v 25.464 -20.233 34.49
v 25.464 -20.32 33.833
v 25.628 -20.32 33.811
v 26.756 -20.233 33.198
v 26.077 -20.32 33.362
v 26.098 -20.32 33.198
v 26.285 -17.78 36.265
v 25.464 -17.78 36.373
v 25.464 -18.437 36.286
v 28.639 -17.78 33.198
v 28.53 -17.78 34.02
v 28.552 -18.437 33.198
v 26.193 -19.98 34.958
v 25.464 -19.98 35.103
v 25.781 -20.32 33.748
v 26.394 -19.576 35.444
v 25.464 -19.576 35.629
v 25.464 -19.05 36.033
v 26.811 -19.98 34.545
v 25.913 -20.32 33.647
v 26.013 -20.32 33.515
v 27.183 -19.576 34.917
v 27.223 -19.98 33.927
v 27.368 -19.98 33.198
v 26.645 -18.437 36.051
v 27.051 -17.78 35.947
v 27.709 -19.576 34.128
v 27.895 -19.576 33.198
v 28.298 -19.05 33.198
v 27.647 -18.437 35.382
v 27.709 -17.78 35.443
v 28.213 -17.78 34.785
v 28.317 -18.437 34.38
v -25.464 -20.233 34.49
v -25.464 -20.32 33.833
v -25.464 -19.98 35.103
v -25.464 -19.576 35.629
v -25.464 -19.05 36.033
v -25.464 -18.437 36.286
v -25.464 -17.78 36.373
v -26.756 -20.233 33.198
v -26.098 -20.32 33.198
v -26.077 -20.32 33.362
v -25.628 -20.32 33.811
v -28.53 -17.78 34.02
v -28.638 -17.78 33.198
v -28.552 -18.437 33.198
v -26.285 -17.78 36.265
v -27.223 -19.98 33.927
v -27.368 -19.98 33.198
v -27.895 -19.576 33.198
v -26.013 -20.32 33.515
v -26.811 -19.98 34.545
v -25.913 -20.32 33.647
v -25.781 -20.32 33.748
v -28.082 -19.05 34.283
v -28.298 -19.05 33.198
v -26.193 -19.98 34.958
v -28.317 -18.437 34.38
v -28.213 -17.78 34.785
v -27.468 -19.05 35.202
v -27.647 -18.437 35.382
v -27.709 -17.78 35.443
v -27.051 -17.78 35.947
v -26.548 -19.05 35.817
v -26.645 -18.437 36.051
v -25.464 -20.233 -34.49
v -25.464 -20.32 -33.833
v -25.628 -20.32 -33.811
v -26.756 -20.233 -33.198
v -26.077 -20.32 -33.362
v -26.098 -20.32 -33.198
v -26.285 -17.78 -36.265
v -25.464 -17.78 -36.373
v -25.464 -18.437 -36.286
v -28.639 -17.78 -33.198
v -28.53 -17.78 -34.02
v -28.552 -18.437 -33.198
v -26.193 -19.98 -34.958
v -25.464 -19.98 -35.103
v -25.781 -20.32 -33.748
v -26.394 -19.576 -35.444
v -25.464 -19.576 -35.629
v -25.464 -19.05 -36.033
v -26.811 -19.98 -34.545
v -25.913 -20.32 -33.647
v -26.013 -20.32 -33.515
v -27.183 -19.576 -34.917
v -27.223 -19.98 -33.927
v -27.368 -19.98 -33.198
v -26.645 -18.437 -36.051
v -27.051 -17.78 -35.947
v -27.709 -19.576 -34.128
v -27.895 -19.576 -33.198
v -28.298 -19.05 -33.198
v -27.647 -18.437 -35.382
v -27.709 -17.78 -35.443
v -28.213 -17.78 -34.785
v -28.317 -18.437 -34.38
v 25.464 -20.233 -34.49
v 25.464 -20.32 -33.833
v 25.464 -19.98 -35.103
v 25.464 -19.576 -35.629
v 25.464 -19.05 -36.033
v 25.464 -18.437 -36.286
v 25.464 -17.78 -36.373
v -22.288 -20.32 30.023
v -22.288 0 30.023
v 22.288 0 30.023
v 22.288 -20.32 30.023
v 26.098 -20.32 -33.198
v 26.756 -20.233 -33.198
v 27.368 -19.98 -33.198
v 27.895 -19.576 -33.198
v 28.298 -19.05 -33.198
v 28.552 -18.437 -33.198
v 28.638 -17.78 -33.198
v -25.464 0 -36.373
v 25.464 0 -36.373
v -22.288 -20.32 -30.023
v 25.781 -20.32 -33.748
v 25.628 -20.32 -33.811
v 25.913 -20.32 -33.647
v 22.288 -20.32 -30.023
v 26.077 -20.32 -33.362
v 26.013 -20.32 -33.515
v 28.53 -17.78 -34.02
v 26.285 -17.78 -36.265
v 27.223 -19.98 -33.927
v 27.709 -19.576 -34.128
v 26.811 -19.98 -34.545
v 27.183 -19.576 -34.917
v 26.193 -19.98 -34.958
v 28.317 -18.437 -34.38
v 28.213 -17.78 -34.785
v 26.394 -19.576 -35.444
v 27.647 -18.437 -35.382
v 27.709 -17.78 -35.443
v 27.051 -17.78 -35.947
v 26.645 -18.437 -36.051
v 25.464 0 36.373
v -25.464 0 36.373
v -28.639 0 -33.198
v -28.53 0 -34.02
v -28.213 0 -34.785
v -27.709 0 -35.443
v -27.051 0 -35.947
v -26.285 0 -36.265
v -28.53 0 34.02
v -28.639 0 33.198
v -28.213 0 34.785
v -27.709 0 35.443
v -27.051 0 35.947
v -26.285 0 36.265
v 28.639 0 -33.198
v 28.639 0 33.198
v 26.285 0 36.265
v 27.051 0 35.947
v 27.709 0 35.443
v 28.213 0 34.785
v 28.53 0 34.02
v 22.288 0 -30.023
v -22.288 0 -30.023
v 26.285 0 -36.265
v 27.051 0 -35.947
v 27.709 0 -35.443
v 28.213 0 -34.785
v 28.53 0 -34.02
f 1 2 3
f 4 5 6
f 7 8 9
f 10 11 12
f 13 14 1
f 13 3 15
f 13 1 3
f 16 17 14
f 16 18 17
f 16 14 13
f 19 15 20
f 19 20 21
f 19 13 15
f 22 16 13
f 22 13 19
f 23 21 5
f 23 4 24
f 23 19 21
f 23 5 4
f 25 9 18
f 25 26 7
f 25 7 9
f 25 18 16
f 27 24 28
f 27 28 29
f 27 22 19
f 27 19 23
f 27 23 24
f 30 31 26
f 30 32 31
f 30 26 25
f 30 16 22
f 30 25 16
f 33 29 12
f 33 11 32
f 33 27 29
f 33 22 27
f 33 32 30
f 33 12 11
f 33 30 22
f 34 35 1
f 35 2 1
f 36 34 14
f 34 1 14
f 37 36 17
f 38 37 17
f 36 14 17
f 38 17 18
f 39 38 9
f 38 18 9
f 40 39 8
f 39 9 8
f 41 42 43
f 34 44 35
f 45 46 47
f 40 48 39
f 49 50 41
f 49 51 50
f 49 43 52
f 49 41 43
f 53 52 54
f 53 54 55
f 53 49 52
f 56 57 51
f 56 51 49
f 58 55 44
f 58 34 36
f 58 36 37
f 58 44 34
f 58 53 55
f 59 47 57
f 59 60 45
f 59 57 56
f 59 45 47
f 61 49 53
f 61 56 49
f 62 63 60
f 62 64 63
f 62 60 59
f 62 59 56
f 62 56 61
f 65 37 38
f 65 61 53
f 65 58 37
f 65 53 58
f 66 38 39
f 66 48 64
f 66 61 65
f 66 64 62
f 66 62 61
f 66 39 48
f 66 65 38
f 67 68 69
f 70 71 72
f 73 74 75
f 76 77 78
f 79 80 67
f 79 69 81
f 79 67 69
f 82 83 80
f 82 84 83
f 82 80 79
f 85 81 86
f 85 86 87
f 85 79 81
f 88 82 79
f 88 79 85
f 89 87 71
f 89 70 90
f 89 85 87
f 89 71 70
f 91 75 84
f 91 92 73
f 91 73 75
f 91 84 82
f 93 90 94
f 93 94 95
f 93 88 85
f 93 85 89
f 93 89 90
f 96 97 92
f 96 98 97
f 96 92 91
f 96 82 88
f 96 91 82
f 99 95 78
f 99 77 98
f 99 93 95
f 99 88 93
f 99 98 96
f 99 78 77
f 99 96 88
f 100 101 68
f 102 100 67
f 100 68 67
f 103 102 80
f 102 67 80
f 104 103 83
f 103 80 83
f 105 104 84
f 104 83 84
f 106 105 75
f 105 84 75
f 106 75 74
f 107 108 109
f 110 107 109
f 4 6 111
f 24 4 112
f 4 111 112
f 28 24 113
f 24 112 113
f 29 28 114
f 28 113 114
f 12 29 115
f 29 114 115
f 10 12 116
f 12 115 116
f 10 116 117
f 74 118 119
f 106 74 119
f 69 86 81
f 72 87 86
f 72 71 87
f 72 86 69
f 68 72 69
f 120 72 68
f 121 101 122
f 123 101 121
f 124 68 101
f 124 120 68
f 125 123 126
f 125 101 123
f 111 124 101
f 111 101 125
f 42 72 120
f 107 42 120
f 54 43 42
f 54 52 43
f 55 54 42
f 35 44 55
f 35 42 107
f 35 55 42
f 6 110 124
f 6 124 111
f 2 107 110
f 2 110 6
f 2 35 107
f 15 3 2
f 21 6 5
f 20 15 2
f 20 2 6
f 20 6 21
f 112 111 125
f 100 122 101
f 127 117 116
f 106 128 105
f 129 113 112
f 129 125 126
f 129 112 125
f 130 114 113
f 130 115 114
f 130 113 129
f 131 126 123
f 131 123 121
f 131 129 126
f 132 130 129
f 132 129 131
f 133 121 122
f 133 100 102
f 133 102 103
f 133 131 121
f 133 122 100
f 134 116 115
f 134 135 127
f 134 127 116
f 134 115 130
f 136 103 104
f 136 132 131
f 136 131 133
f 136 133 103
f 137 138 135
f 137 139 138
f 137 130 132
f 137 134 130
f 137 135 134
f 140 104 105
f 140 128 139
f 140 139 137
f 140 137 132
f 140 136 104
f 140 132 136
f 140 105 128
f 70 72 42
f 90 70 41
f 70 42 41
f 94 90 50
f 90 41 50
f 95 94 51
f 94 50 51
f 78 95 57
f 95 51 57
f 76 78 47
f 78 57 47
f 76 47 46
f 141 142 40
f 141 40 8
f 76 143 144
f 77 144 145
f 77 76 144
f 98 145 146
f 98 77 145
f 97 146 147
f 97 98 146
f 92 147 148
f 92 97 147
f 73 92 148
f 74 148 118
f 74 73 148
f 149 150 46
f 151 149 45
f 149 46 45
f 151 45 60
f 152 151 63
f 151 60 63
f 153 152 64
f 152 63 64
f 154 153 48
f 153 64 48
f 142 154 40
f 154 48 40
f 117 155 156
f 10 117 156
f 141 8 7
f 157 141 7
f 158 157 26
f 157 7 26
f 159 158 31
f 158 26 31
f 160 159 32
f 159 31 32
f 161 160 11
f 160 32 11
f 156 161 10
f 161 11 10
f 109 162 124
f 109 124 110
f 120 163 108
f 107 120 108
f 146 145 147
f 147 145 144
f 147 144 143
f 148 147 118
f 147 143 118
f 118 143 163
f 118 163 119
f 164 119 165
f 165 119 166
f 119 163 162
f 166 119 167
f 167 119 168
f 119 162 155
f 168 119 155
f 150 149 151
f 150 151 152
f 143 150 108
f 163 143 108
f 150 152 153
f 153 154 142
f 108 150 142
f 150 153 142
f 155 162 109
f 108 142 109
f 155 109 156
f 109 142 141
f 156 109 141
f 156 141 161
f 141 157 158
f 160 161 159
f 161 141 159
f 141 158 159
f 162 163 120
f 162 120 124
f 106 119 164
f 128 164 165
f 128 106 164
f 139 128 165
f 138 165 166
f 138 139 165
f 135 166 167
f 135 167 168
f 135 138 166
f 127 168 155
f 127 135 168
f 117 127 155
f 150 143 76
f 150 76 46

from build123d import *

# Parameters (mm, degrees)
F0_W     = 57.277
F0_H     = 72.7456
F0_W_2   = 44.577
F0_H_2   = 60.0456
F1_DEPTH = 20.32
F2_R     = 3.175
F3_R     = 2.54


with BuildPart() as f1:
    # F0 (on Front) → F1 (new body)
    with BuildSketch(Plane.XZ):
        Rectangle(F0_W, F0_H)
        Rectangle(F0_W_2, F0_H_2, mode=Mode.SUBTRACT)
    extrude(amount=F1_DEPTH)

    # F2
    f2_edges = [f1.edges().sort_by_distance(p)[0] for p in [
        (28.6385, -10.16, 36.3728),
        (28.6385, -10.16, -36.3728),
        (-28.6385, -10.16, -36.3728),
        (-28.6385, -10.16, 36.3728),
    ]]
    fillet(f2_edges, radius=F2_R)

    # F3
    f3_edges = [f1.edges().sort_by_distance(p)[0] for p in [
        (0, -20.32, 36.3728),
    ]]
    fillet(f3_edges, radius=F3_R)


solid = f1.part
